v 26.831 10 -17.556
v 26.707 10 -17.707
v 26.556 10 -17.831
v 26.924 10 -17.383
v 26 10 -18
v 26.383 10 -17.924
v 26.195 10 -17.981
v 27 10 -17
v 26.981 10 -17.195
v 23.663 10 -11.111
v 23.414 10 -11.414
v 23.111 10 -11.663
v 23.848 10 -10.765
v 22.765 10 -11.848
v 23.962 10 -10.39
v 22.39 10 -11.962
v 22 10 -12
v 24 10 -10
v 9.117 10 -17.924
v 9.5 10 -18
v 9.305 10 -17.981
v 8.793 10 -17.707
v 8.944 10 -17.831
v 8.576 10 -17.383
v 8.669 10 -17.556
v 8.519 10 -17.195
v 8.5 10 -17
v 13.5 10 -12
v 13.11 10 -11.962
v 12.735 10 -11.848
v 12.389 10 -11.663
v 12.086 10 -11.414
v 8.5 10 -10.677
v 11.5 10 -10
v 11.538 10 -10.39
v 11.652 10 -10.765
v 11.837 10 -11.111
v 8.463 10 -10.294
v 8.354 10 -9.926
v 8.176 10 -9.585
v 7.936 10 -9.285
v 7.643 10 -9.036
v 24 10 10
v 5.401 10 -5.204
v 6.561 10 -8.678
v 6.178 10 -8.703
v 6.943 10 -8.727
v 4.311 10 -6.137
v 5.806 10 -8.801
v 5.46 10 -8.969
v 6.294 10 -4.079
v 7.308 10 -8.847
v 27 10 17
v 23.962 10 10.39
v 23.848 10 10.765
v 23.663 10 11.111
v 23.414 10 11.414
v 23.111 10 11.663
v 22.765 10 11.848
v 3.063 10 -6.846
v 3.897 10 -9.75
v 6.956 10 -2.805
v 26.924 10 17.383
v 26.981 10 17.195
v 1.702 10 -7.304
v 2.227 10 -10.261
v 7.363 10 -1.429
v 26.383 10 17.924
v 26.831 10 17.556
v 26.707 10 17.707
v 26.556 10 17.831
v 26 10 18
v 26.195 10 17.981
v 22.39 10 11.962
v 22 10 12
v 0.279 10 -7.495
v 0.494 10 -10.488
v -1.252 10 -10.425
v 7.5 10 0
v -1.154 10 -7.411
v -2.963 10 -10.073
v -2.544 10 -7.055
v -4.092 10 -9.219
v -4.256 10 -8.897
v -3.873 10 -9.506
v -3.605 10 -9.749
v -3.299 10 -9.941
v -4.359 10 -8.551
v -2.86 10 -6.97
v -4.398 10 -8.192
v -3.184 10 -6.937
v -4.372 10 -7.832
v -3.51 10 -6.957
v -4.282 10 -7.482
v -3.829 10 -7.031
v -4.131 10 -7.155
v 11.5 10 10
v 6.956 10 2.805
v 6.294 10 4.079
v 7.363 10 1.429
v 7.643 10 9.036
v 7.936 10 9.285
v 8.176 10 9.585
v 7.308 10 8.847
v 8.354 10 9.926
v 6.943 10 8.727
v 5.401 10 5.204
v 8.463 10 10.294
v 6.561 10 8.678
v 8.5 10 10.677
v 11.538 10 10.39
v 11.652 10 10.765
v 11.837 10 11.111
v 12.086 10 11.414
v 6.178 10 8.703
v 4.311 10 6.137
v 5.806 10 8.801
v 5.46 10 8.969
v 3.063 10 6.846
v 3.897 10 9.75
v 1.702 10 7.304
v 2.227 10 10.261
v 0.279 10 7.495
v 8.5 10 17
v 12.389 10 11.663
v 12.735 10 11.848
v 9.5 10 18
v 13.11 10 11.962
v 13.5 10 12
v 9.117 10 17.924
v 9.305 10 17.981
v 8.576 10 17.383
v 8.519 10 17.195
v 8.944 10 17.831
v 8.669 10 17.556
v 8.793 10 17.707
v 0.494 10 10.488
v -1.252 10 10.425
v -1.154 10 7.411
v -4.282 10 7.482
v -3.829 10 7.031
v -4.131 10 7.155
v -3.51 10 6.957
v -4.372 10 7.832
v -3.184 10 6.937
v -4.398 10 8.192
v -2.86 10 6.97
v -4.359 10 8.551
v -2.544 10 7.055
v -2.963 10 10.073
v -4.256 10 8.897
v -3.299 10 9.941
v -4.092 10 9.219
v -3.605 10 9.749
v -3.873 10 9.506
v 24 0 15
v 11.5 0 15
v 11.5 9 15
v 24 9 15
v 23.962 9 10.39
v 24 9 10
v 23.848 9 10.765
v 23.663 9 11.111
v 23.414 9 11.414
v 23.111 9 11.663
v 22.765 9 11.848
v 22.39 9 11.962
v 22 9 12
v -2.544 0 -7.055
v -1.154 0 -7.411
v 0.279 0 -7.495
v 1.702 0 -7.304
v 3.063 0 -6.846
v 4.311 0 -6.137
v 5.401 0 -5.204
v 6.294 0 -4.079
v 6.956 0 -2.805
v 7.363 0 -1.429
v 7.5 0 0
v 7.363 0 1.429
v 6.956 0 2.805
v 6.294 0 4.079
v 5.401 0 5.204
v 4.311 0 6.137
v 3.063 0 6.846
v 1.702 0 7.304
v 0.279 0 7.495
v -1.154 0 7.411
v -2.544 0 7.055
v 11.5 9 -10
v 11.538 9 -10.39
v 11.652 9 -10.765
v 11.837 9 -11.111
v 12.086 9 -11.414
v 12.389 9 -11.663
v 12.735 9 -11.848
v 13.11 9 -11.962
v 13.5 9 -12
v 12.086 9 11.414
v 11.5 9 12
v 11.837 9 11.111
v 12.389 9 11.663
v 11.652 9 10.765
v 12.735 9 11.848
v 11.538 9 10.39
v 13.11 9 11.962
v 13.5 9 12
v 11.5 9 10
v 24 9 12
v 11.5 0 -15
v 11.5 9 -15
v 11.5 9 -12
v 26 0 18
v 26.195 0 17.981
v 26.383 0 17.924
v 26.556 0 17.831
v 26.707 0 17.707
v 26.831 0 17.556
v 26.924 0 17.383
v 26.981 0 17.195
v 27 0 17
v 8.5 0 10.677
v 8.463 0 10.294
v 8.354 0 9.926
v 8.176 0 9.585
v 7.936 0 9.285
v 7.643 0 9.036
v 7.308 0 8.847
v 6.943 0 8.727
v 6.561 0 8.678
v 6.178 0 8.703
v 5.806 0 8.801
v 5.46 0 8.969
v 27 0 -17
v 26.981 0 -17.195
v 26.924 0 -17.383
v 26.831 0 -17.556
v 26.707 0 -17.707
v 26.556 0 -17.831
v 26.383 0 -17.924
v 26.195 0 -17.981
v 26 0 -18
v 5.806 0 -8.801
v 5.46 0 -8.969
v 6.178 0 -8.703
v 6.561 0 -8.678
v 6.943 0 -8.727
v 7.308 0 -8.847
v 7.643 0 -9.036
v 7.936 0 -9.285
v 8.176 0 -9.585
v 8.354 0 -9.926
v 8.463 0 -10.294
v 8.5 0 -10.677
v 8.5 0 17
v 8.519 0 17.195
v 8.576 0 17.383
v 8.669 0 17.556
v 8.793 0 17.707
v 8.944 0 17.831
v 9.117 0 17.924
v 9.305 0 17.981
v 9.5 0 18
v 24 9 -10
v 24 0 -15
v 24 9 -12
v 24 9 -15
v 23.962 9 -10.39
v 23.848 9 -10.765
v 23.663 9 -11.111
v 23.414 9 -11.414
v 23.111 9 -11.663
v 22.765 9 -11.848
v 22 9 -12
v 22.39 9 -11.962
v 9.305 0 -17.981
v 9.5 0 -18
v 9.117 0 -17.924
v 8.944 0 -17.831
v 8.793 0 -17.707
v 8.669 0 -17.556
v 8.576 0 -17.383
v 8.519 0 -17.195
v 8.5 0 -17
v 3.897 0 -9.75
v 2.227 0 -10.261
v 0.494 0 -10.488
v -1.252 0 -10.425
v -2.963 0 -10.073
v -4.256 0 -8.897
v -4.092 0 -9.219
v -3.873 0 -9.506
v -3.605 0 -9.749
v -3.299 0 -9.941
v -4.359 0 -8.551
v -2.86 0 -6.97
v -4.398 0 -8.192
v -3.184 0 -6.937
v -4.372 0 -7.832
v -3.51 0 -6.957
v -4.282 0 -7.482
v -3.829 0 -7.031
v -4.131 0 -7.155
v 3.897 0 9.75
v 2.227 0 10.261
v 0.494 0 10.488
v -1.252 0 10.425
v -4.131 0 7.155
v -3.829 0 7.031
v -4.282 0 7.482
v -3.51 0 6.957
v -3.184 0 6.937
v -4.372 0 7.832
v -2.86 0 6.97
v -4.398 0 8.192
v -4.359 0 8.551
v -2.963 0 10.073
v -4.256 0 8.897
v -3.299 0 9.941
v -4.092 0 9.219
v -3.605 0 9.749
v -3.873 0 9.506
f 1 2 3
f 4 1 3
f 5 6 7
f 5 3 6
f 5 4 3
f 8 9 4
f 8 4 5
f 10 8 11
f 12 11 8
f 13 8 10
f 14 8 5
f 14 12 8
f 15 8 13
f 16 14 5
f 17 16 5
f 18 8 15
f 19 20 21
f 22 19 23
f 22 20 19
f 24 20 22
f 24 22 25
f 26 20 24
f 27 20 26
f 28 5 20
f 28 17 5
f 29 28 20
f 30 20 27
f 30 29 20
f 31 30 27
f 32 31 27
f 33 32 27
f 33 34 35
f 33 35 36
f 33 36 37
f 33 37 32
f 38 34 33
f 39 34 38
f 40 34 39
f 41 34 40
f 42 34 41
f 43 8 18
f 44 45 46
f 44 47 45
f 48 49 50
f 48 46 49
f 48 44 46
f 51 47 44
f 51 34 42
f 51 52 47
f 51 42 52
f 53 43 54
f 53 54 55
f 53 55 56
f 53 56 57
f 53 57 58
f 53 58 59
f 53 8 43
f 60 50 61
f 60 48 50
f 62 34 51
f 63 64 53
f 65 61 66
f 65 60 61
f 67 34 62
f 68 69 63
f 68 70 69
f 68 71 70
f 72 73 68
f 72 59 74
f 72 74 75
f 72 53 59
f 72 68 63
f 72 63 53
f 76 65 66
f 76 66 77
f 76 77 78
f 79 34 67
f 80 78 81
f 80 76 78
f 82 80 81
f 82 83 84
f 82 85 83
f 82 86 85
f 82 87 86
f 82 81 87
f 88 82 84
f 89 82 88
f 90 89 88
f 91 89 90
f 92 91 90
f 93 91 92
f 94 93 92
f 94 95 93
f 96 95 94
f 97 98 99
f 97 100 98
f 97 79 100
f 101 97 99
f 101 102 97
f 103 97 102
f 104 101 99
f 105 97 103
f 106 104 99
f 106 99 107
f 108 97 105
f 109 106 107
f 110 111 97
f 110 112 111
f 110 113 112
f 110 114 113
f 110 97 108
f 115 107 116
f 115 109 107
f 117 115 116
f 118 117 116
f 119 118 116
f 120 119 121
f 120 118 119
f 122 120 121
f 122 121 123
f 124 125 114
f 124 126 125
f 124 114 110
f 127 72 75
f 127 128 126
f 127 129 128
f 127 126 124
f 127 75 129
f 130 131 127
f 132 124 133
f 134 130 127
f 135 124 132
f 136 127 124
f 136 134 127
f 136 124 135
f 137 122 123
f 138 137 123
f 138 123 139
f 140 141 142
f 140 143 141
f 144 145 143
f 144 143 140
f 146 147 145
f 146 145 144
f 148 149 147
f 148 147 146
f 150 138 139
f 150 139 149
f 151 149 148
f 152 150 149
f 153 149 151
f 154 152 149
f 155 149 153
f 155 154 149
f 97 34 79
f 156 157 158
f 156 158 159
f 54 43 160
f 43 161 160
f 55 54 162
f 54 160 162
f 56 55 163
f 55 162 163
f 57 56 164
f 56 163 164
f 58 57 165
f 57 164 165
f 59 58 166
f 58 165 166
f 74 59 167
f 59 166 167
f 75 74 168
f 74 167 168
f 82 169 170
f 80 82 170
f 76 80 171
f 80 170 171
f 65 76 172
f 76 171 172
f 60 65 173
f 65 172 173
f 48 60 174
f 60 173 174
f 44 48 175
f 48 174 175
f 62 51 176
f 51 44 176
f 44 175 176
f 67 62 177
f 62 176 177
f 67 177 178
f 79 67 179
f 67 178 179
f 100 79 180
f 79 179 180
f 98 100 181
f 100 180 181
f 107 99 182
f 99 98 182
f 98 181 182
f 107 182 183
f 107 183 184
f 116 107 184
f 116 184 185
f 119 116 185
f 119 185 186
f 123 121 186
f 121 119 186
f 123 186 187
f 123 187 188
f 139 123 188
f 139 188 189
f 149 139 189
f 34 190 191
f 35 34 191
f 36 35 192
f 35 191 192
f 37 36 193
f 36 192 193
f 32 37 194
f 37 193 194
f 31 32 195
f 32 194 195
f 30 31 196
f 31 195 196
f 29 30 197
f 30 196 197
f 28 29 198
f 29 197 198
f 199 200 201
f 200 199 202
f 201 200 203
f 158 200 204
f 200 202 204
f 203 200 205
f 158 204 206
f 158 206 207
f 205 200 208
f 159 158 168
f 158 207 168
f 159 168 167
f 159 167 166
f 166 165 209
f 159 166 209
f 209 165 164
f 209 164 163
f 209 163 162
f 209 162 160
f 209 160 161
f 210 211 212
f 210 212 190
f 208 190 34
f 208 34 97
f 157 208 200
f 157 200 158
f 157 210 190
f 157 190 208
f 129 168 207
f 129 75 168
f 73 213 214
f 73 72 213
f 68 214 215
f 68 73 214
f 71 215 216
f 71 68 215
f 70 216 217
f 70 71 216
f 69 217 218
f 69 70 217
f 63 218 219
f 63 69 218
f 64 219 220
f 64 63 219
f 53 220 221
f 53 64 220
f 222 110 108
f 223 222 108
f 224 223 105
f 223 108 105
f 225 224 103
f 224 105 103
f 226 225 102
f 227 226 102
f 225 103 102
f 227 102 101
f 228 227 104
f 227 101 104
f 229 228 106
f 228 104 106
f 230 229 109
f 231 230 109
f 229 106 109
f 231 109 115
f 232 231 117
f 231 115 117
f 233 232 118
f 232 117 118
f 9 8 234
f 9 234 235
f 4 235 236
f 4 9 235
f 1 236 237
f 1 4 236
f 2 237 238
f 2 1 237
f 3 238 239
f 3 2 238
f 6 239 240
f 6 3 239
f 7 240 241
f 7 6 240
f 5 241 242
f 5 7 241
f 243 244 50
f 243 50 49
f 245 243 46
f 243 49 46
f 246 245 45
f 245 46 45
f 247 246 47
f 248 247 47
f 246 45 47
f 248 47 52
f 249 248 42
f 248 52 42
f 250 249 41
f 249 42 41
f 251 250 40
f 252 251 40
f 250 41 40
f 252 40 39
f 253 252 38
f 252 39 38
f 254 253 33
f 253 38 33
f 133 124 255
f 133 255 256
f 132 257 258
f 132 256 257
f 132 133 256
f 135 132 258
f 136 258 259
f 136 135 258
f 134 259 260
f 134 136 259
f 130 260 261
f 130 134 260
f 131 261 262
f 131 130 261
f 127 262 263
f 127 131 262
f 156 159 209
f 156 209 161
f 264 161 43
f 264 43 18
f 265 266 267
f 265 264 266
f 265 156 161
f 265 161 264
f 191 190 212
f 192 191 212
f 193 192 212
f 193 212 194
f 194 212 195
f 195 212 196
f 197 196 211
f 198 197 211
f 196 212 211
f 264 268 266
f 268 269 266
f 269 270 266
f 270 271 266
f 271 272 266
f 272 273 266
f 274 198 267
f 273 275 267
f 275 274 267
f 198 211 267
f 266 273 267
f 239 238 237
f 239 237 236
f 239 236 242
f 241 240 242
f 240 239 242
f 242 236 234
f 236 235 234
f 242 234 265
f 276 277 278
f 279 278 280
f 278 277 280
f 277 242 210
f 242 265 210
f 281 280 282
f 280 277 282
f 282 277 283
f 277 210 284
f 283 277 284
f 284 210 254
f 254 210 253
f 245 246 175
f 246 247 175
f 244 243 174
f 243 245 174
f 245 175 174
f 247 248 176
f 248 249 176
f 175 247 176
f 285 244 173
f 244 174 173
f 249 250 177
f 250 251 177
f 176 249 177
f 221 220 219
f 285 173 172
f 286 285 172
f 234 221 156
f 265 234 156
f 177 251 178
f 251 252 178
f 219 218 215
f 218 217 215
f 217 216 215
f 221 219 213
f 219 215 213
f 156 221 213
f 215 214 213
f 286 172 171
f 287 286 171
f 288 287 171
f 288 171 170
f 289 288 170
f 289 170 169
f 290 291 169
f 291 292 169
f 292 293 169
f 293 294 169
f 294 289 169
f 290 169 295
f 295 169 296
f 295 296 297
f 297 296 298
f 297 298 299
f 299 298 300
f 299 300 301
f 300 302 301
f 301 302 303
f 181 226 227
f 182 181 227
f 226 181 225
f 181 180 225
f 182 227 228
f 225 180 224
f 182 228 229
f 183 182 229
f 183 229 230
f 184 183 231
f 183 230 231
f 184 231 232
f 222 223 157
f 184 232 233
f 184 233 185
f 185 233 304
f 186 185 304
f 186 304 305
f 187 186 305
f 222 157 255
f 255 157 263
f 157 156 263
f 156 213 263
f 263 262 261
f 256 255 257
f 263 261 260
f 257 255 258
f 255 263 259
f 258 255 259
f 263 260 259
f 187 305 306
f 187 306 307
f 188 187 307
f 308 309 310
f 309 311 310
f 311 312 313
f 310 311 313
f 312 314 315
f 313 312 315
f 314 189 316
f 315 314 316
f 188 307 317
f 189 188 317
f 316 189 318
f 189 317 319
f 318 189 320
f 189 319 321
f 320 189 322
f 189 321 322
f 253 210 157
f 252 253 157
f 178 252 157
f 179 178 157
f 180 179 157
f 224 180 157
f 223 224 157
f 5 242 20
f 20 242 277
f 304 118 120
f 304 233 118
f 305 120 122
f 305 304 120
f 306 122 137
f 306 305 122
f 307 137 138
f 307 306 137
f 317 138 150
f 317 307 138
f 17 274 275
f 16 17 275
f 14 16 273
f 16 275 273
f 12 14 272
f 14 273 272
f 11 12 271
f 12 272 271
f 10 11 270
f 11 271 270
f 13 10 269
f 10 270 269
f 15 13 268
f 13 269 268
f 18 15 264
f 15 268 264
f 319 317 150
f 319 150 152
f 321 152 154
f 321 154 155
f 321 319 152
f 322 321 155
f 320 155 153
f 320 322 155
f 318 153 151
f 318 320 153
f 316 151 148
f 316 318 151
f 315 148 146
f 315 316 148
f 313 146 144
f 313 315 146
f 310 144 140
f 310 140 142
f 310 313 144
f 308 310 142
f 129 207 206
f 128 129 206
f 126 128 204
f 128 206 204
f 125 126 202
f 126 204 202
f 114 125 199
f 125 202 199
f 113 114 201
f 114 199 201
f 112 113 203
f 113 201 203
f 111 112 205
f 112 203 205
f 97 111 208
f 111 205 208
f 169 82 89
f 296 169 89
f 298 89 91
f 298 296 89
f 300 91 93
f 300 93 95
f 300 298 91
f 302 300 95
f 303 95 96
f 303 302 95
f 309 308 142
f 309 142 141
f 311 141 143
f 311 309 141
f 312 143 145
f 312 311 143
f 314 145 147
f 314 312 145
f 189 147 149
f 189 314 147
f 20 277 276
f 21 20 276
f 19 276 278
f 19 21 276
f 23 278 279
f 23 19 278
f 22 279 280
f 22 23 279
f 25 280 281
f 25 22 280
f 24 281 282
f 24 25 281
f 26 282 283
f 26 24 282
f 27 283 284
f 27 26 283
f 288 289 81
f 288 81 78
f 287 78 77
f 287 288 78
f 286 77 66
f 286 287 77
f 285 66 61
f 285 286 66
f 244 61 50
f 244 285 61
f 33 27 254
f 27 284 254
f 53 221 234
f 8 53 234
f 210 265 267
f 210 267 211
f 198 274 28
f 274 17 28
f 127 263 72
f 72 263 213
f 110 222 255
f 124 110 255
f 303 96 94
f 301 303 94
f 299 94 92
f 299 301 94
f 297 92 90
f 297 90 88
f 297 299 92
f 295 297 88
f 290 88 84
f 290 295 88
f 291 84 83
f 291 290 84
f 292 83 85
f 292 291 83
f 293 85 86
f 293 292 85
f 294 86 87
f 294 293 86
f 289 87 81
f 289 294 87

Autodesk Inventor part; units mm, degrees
ref_plane "YZ Plane" through (0, 0, 0) normal (1, 0, 0) x (0, 1, 0)
ref_plane "XZ Plane" through (0, 0, 0) normal (0, 1, 0) x (-1, 0, 0)
ref_plane "XY Plane" through (0, 0, 0) normal (0, 0, 1) x (1, 0, 0)
sketch "Sketch1" plane through (0, 0, 0) normal (0, 1, 0) x (-1, 0, 0)
  arc A0 (3.75, 6.4952) -> (3.75, -6.4952) centre (0, 0) ccw
  arc A1 (5.25, 9.0933) -> (5.25, -9.0933) centre (0, 0) ccw
  line L0 (-11.5, 15) -> (-24, 15)
  line L1 (-24, 15) -> (-24, -15)
  line L2 (-24, -15) -> (-11.5, -15)
  line L3 (-11.5, -15) -> (-11.5, 15)
  line L4 (-8.5, 18) -> (-27, 18)
  line L5 (-27, 18) -> (-27, -18)
  line L6 (-27, -18) -> (-8.5, -18)
  line L7 (-8.5, -18) -> (-8.5, 18)
  line L8 (0, 0) -> (5.25, 9.0933)
  line L9 (0, 0) -> (10.5, 0) construction
  line L10 (5.25, 9.0933) -> (0, 0)
  line L11 (0, 0) -> (5.25, -9.0933)
  line L12 (0, 0) -> (10.5, 0) construction
  dimension "d0" = 15
  dimension "d1" = 3
  dimension "d2" = 12.5
  dimension "d3" = 30
  dimension "d4" = 3
  dimension "d5" = 3
  dimension "d6" = 3
  dimension "d7" = 3
  dimension "d8" = 15
  dimension "d9" = 11.5
  dimension "d10" = 60
  dimension "d11" = 60
extrude "Extrusion1" add sketch "Sketch1" along normal blind 10 contours A0 L11 A1 L7 L8 | L7 A1 | A1 L7 L6 L5 L4
fillet "Fillet1" radius 2 4 edges at (-5.25, 5, 9.0933) (-3.75, 5, 6.4952) (-5.25, 5, -9.0933) (-3.75, 5, -6.4952)
fillet "Fillet2" radius 2 2 edges at (8.5, 5, 6.1644) (8.5, 5, -6.1644)
fillet "Fillet3" radius 1 4 edges at (8.5, 5, 18) (27, 5, 18) (8.5, 5, -18) (27, 5, -18)
sketch "Sketch2" plane through (0, 10, 0) normal (0, 1, 0) x (1, 0, 0)
  line L0 (11.5, -15) -> (11.5, 15) projected
  line L1 (11.5, 15) -> (24, 15) projected
  line L2 (24, 15) -> (24, -15) projected
  line L3 (24, -15) -> (11.5, -15) projected
  arc A0 (27, 17) -> (26, 18) centre (26, 17) ccw projected
  line L4 (26, 18) -> (9.5, 18) projected
  arc A1 (9.5, 18) -> (8.5, 17) centre (9.5, 17) ccw projected
  line L5 (8.5, 17) -> (8.5, 10.6771) projected
  arc A2 (5.46, 8.9687) -> (8.5, 10.6771) centre (6.5, 10.6771) ccw projected
  arc A3 (5.46, 8.9687) -> (-2.963, 10.0733) centre (0, 0) ccw projected
  arc A4 (-2.963, 10.0733) -> (-4.1307, 7.1545) centre (-2.3986, 8.1545) ccw projected
  arc A5 (-4.1307, 7.1545) -> (-2.5443, 7.0552) centre (-3.2228, 8.9366) ccw projected
  arc A6 (-2.5443, -7.0552) -> (-2.5443, 7.0552) centre (0, 0) ccw projected
  arc A7 (-2.5443, -7.0552) -> (-4.1307, -7.1545) centre (-3.2228, -8.9366) ccw projected
  arc A8 (-4.1307, -7.1545) -> (-2.963, -10.0733) centre (-2.3986, -8.1545) ccw projected
  arc A9 (-2.963, -10.0733) -> (5.46, -8.9687) centre (0, 0) ccw projected
  arc A10 (8.5, -10.6771) -> (5.46, -8.9687) centre (6.5, -10.6771) ccw projected
  line L6 (8.5, -10.6771) -> (8.5, -17) projected
  arc A11 (8.5, -17) -> (9.5, -18) centre (9.5, -17) ccw projected
  line L7 (9.5, -18) -> (26, -18) projected
  arc A12 (26, -18) -> (27, -17) centre (26, -17) ccw projected
  line L8 (27, -17) -> (27, 17) projected
  line L9 (11.5, 15) -> (24, 15)
  line L10 (24, 15) -> (24, 12)
  line L11 (24, 12) -> (11.5, 12)
  line L12 (11.5, 12) -> (11.5, 15)
  line L13 (11.5, -15) -> (24, -15)
  line L14 (24, -15) -> (24, -12)
  line L15 (24, -12) -> (11.5, -12)
  line L16 (11.5, -12) -> (11.5, -15)
  dimension "d17" = 3
  dimension "d18" = 3
extrude "Extrusion2" add sketch "Sketch2" against normal blind 1 contours L0 L15 L2 L3 | L0 L1 L2 L11
fillet "Fillet4" radius 2 4 edges at (11.5, 9.5, -12) (24, 9.5, -12) (11.5, 9.5, 12) (24, 9.5, 12)
equation "\"d5\" = d4"
equation "\"d6\" = d4"
equation "\"d7\" = d4"
equation "\"d8\" = 0.5 * d3"
properties part number "clip"
